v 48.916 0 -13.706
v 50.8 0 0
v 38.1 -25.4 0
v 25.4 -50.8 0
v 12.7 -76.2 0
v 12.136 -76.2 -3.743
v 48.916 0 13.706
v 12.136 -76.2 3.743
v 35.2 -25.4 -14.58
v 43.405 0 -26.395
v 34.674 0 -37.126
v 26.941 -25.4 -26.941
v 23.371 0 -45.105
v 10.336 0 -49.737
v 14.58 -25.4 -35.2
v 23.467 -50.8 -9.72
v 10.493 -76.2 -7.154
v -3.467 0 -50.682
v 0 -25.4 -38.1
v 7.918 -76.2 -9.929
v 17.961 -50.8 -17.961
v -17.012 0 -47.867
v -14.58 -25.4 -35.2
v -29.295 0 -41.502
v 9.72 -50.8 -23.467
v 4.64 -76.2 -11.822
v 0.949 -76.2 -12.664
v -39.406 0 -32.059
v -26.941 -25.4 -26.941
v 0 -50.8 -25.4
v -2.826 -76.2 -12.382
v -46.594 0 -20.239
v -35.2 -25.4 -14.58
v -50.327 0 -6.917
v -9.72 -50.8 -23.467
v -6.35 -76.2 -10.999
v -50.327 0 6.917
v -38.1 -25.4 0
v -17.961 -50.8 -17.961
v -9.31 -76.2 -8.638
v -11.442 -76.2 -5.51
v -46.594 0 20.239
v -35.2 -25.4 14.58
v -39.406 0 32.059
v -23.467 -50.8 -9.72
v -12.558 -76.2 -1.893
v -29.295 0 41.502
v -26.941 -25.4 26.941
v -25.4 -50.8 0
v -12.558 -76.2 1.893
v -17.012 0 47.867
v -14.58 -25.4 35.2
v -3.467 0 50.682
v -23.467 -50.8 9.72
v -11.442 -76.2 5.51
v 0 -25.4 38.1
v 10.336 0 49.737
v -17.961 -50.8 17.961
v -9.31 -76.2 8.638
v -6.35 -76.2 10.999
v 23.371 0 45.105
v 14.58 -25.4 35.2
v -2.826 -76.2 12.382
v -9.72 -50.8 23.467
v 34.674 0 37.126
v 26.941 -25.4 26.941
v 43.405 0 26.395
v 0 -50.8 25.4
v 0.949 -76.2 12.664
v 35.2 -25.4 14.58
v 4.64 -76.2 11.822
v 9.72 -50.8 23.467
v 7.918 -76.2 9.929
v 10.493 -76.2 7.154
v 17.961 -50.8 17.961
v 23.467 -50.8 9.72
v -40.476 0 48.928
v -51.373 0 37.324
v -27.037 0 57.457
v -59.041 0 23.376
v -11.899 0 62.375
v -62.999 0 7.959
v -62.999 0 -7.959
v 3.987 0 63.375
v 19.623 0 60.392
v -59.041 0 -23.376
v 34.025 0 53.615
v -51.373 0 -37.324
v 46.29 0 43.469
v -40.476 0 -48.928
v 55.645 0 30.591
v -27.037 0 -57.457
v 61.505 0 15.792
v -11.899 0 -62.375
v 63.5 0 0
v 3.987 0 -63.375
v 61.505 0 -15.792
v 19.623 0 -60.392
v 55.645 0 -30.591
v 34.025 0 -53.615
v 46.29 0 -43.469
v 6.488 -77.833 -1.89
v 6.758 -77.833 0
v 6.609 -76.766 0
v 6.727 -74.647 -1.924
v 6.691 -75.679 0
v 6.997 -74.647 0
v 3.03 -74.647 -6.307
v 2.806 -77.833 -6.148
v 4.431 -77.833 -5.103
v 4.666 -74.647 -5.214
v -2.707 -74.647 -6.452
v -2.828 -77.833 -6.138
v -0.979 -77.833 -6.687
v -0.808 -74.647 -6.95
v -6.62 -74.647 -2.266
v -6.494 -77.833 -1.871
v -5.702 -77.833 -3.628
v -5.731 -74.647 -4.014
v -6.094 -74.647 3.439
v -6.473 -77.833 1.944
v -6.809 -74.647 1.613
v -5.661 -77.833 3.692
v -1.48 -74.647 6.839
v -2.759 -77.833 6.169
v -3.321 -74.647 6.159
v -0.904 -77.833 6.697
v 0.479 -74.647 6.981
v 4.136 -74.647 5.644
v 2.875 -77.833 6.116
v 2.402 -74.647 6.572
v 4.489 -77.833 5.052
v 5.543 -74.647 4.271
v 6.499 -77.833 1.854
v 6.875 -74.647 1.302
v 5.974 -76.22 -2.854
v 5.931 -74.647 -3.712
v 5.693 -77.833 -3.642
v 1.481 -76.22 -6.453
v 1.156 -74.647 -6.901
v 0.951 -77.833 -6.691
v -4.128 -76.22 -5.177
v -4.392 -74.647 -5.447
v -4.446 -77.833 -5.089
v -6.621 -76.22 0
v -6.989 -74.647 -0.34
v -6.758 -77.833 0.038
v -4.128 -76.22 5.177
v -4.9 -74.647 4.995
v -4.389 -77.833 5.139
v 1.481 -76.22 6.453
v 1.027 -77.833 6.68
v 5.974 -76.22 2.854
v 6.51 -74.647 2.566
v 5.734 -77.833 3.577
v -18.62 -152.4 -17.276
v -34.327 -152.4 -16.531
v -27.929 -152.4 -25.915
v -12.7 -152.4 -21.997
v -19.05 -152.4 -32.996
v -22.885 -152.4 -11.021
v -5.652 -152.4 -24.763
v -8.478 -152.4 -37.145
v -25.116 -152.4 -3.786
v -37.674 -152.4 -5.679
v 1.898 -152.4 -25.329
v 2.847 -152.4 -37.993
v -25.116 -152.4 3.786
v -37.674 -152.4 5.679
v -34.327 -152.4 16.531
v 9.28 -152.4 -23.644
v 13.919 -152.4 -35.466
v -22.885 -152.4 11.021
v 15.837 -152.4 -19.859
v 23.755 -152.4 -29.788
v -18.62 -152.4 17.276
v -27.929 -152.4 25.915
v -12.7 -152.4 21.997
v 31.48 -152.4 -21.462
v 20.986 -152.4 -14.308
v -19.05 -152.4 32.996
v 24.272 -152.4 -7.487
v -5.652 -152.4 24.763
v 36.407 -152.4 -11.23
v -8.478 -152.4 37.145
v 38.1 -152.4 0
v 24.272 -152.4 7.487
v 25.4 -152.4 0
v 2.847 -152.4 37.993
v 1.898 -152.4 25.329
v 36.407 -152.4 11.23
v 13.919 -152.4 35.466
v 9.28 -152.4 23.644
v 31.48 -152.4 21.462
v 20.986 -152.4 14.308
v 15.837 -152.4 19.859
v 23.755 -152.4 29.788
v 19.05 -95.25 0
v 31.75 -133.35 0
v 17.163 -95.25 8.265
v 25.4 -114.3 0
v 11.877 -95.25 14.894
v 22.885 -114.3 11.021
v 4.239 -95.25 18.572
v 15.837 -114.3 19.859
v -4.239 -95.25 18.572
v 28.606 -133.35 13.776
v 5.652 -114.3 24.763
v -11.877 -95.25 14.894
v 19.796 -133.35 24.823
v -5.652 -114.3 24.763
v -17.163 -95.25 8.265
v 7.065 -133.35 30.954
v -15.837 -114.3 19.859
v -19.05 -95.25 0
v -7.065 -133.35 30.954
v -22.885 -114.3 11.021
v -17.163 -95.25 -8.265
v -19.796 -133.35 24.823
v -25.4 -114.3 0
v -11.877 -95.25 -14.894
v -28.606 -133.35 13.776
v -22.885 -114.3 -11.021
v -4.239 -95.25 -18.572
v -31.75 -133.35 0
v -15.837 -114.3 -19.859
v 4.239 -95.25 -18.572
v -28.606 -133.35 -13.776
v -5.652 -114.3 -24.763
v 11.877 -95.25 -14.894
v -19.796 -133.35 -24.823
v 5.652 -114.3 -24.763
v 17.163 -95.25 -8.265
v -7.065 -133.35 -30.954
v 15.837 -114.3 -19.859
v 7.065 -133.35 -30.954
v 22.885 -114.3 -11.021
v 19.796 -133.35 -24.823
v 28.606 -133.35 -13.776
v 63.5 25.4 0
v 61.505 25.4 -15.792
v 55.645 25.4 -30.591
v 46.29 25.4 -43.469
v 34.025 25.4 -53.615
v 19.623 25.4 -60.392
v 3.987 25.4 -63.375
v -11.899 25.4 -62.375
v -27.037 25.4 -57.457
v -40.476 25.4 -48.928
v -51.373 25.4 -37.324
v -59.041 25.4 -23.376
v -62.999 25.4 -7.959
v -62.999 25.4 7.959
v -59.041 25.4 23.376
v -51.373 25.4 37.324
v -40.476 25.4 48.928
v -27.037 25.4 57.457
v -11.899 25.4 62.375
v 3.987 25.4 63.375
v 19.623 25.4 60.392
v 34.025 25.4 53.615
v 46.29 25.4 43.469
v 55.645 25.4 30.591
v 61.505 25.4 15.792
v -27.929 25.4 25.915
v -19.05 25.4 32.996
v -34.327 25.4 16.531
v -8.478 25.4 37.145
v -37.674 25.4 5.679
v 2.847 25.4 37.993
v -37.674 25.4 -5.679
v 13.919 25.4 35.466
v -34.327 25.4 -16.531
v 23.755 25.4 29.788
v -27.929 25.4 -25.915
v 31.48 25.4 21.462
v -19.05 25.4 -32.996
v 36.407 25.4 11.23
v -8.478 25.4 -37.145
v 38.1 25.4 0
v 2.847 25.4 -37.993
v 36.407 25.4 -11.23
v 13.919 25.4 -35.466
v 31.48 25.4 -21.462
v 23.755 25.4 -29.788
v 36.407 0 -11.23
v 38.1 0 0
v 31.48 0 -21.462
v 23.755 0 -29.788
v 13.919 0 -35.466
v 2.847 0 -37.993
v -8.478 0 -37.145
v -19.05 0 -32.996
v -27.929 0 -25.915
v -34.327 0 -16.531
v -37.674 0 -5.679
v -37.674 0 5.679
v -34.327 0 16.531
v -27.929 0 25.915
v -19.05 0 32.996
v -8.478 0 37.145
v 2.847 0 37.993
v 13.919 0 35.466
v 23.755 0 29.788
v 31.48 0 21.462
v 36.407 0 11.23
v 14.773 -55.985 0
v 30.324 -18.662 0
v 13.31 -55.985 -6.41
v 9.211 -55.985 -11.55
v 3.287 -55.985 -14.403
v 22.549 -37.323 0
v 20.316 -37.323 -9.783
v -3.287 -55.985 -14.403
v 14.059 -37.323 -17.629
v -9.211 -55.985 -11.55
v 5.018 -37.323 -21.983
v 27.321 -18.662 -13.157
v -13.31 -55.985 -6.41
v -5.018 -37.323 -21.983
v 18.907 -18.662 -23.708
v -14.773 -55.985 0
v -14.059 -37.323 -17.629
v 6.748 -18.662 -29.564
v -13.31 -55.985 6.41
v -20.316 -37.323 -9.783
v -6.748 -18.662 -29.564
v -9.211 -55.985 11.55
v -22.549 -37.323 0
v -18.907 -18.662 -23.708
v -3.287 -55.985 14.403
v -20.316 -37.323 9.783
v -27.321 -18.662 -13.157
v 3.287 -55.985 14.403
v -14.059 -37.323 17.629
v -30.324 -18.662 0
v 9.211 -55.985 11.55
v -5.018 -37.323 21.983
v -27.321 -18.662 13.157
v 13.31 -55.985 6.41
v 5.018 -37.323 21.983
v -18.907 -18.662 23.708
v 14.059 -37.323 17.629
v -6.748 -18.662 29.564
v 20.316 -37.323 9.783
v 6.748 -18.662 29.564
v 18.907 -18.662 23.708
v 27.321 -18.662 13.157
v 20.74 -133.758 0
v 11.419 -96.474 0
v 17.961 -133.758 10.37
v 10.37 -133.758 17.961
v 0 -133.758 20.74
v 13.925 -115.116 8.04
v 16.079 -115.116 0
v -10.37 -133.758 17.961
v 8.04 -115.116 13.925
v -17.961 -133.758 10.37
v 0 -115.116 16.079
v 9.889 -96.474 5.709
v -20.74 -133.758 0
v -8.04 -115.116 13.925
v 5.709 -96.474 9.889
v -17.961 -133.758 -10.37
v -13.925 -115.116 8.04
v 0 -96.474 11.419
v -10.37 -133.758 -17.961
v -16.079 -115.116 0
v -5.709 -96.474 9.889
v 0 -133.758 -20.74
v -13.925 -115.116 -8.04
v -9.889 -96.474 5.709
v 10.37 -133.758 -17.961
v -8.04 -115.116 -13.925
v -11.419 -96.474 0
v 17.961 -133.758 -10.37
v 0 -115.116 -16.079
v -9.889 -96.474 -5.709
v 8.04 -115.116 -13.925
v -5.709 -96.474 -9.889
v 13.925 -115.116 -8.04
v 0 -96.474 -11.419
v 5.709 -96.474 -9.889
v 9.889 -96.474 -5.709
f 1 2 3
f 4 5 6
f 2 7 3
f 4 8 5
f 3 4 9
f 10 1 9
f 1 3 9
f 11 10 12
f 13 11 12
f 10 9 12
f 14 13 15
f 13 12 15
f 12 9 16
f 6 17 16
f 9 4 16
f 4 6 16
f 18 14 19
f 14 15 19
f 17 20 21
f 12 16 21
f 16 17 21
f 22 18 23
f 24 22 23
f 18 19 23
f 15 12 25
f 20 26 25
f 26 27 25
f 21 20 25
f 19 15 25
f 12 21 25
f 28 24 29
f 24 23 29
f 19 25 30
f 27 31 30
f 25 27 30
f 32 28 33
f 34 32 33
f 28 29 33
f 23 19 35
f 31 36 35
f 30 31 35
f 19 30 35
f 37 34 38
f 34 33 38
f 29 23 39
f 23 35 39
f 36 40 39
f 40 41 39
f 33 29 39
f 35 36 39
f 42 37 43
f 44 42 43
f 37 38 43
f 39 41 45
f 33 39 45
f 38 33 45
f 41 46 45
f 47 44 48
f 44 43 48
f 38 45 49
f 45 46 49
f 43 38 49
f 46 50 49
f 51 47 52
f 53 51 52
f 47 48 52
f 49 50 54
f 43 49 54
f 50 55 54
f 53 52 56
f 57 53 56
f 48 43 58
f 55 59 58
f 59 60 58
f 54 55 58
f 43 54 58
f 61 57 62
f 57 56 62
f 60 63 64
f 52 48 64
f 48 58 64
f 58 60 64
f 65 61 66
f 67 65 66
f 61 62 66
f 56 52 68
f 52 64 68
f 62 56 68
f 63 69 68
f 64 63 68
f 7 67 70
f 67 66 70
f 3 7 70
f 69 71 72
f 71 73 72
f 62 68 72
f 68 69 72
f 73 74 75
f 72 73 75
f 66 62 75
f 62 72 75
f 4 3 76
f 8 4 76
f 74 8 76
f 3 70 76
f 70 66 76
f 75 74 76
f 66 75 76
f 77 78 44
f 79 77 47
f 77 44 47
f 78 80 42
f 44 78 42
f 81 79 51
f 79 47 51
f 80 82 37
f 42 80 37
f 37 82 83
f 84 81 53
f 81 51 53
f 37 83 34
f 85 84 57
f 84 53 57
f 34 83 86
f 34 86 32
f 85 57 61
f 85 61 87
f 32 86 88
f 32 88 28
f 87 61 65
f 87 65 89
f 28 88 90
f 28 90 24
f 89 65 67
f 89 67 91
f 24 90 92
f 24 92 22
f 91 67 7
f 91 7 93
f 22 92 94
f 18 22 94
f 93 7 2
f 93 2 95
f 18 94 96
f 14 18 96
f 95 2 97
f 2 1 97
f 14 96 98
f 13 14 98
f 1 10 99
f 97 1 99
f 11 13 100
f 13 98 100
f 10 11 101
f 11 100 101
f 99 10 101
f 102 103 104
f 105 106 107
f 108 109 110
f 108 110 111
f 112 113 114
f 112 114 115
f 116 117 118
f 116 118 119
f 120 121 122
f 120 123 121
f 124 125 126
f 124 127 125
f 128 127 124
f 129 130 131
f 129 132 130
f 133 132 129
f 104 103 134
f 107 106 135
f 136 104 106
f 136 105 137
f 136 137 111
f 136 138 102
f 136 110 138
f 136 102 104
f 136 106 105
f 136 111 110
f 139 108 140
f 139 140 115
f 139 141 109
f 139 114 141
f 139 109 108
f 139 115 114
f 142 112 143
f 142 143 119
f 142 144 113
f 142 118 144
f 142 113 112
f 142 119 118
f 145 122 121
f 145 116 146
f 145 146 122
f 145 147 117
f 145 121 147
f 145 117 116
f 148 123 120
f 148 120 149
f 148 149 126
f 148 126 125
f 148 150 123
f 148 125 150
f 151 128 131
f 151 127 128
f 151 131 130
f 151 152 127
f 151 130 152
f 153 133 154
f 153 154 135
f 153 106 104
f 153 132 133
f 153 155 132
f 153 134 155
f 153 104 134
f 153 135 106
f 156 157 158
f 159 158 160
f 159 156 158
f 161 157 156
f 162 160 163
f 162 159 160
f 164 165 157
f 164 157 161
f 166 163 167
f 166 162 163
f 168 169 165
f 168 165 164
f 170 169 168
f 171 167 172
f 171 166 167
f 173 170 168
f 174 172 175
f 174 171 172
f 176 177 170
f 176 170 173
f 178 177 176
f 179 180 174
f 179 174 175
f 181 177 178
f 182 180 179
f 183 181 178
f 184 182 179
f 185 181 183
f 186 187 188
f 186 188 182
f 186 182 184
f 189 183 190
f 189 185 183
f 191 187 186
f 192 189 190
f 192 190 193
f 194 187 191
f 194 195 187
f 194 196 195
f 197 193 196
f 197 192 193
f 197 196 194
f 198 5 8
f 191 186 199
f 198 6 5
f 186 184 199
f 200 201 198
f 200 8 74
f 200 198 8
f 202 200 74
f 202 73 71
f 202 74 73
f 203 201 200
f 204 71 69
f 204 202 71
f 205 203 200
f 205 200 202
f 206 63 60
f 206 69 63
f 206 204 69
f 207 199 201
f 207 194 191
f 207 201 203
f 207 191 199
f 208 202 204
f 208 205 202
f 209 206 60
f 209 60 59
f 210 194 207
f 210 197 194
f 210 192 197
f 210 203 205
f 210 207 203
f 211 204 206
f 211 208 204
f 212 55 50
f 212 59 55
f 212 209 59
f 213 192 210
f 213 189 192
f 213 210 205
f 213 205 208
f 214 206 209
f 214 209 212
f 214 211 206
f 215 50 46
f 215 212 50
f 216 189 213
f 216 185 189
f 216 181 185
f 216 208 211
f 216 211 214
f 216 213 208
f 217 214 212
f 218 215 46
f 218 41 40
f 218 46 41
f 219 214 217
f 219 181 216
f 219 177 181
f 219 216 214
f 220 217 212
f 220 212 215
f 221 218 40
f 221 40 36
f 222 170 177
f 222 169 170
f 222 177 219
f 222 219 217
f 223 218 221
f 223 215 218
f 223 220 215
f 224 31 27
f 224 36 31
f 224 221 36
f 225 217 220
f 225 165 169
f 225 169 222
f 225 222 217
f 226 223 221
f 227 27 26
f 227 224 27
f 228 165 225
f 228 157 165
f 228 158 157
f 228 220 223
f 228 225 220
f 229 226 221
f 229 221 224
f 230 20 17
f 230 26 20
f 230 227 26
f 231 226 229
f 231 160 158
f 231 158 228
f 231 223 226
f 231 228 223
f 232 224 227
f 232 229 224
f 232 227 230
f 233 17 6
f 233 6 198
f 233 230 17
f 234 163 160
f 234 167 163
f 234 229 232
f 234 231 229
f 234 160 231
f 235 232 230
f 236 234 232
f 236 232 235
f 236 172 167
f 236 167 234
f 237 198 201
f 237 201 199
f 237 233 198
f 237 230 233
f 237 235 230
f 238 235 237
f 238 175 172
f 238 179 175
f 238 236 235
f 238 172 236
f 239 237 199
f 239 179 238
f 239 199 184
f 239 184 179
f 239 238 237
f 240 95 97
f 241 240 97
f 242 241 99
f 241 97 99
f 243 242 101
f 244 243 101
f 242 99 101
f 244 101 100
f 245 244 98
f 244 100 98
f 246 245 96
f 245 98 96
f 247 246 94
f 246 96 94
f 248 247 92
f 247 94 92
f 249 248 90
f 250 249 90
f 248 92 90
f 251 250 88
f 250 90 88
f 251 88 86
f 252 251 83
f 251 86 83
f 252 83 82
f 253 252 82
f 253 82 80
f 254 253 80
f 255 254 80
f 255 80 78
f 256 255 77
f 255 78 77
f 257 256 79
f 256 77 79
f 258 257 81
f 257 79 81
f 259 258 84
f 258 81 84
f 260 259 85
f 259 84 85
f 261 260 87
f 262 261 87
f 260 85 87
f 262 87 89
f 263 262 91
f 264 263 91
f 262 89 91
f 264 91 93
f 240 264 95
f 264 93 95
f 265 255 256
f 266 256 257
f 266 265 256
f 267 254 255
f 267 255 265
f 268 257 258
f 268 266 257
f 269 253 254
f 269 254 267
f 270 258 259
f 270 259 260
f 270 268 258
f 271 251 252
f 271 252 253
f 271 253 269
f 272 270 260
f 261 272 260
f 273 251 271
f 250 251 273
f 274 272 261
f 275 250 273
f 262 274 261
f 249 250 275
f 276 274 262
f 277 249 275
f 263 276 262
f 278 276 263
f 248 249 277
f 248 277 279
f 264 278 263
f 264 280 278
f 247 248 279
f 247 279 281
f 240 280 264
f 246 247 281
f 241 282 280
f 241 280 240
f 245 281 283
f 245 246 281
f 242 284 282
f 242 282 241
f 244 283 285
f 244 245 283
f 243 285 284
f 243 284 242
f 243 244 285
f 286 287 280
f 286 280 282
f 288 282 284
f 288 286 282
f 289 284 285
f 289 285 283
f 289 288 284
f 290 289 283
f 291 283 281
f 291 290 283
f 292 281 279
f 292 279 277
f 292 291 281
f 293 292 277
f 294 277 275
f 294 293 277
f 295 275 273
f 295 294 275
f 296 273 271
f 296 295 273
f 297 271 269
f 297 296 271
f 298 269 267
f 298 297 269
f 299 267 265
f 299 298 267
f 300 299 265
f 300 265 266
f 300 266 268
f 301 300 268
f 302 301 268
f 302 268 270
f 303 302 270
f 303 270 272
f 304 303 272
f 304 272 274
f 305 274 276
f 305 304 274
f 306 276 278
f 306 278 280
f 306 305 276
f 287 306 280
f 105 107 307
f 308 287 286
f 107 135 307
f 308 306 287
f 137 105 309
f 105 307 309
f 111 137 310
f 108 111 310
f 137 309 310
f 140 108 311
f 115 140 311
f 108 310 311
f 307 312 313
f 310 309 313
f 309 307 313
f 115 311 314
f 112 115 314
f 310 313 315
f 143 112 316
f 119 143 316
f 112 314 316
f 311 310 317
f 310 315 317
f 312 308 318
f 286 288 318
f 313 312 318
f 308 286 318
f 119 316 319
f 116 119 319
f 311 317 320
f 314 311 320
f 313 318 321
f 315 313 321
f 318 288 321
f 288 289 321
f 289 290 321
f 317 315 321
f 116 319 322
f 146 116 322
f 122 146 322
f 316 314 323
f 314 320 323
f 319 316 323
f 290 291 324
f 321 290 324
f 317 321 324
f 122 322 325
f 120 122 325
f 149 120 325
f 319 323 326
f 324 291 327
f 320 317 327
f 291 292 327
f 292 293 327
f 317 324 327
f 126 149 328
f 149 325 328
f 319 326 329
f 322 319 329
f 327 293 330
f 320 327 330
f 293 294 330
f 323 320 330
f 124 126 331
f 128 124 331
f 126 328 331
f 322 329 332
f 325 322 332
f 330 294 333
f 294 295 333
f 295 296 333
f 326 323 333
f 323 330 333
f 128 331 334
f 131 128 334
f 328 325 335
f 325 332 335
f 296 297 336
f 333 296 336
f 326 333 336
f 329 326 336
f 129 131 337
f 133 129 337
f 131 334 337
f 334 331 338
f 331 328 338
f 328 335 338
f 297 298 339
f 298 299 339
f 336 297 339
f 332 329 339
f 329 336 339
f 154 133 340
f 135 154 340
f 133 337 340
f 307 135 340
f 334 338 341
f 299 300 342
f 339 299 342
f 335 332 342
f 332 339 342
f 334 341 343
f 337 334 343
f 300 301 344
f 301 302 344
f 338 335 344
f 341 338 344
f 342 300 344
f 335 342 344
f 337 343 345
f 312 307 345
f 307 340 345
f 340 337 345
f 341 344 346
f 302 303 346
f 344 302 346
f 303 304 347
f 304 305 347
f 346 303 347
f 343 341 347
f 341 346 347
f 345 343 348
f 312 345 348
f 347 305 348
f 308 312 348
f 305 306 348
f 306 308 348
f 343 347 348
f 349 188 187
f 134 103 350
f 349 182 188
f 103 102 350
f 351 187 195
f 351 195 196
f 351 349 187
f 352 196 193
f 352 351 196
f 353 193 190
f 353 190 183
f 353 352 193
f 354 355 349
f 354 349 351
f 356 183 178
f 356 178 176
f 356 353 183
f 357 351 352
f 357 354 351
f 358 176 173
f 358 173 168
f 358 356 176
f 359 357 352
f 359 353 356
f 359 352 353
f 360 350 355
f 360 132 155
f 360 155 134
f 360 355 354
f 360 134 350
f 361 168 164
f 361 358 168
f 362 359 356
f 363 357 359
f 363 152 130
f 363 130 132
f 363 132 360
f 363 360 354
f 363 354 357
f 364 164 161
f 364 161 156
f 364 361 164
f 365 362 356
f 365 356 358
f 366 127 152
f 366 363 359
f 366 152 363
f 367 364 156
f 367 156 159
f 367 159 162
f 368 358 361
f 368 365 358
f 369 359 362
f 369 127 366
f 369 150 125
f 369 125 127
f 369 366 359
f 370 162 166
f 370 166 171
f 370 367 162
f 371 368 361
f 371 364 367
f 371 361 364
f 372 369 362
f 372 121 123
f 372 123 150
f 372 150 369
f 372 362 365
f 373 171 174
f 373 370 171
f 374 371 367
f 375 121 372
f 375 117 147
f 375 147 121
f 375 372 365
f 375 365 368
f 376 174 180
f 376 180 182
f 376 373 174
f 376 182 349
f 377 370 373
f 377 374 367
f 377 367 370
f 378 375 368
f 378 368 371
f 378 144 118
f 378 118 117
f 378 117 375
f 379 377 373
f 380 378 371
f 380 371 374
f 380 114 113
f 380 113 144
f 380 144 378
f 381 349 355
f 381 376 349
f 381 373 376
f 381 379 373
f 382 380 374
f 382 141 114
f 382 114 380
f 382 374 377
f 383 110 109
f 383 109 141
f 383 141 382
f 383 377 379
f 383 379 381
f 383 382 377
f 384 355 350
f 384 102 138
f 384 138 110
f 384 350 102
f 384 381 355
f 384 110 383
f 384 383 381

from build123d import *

# Parameters (mm, degrees)
SKETCH1_R           = 63.5
SKETCH1_R_2         = 38.1
BOSS_EXTRUDE1_DEPTH = 25.4
FILLET1_R           = 5.08


with BuildPart() as part:
    # Sketch1 → Boss-Extrude1 (new body)
    with BuildSketch(Plane(origin=(0, 0, 0), x_dir=(1, 0, 0), z_dir=(0, 1, 0))):
        Circle(SKETCH1_R)
        Circle(SKETCH1_R_2, mode=Mode.SUBTRACT)
    extrude(amount=BOSS_EXTRUDE1_DEPTH)

    # Sketch4 → Revolve1 (revolve)
    with BuildSketch(Plane.XY):
        Polygon((50.8, 0), (12.7, -76.2), (6.35, -76.2), (38.1, 0), align=None)
    revolve(axis=Axis((0, -76.2, 0), (0, 1, 0)))

    # Sketch6 → Revolve2 (revolve)
    with BuildSketch(Plane.XY):
        Polygon((12.7, -76.2), (38.1, -152.4), (25.4, -152.4), (6.35, -76.2), align=None)
    revolve(axis=Axis((0, -76.2, 0), (0, -1, 0)))

    # Fillet1
    fillet1_edges = [part.edges().sort_by_distance(p)[0] for p in [
        (-6.35, -76.2, 0),
    ]]
    fillet(fillet1_edges, radius=FILLET1_R)


solid = part.part
